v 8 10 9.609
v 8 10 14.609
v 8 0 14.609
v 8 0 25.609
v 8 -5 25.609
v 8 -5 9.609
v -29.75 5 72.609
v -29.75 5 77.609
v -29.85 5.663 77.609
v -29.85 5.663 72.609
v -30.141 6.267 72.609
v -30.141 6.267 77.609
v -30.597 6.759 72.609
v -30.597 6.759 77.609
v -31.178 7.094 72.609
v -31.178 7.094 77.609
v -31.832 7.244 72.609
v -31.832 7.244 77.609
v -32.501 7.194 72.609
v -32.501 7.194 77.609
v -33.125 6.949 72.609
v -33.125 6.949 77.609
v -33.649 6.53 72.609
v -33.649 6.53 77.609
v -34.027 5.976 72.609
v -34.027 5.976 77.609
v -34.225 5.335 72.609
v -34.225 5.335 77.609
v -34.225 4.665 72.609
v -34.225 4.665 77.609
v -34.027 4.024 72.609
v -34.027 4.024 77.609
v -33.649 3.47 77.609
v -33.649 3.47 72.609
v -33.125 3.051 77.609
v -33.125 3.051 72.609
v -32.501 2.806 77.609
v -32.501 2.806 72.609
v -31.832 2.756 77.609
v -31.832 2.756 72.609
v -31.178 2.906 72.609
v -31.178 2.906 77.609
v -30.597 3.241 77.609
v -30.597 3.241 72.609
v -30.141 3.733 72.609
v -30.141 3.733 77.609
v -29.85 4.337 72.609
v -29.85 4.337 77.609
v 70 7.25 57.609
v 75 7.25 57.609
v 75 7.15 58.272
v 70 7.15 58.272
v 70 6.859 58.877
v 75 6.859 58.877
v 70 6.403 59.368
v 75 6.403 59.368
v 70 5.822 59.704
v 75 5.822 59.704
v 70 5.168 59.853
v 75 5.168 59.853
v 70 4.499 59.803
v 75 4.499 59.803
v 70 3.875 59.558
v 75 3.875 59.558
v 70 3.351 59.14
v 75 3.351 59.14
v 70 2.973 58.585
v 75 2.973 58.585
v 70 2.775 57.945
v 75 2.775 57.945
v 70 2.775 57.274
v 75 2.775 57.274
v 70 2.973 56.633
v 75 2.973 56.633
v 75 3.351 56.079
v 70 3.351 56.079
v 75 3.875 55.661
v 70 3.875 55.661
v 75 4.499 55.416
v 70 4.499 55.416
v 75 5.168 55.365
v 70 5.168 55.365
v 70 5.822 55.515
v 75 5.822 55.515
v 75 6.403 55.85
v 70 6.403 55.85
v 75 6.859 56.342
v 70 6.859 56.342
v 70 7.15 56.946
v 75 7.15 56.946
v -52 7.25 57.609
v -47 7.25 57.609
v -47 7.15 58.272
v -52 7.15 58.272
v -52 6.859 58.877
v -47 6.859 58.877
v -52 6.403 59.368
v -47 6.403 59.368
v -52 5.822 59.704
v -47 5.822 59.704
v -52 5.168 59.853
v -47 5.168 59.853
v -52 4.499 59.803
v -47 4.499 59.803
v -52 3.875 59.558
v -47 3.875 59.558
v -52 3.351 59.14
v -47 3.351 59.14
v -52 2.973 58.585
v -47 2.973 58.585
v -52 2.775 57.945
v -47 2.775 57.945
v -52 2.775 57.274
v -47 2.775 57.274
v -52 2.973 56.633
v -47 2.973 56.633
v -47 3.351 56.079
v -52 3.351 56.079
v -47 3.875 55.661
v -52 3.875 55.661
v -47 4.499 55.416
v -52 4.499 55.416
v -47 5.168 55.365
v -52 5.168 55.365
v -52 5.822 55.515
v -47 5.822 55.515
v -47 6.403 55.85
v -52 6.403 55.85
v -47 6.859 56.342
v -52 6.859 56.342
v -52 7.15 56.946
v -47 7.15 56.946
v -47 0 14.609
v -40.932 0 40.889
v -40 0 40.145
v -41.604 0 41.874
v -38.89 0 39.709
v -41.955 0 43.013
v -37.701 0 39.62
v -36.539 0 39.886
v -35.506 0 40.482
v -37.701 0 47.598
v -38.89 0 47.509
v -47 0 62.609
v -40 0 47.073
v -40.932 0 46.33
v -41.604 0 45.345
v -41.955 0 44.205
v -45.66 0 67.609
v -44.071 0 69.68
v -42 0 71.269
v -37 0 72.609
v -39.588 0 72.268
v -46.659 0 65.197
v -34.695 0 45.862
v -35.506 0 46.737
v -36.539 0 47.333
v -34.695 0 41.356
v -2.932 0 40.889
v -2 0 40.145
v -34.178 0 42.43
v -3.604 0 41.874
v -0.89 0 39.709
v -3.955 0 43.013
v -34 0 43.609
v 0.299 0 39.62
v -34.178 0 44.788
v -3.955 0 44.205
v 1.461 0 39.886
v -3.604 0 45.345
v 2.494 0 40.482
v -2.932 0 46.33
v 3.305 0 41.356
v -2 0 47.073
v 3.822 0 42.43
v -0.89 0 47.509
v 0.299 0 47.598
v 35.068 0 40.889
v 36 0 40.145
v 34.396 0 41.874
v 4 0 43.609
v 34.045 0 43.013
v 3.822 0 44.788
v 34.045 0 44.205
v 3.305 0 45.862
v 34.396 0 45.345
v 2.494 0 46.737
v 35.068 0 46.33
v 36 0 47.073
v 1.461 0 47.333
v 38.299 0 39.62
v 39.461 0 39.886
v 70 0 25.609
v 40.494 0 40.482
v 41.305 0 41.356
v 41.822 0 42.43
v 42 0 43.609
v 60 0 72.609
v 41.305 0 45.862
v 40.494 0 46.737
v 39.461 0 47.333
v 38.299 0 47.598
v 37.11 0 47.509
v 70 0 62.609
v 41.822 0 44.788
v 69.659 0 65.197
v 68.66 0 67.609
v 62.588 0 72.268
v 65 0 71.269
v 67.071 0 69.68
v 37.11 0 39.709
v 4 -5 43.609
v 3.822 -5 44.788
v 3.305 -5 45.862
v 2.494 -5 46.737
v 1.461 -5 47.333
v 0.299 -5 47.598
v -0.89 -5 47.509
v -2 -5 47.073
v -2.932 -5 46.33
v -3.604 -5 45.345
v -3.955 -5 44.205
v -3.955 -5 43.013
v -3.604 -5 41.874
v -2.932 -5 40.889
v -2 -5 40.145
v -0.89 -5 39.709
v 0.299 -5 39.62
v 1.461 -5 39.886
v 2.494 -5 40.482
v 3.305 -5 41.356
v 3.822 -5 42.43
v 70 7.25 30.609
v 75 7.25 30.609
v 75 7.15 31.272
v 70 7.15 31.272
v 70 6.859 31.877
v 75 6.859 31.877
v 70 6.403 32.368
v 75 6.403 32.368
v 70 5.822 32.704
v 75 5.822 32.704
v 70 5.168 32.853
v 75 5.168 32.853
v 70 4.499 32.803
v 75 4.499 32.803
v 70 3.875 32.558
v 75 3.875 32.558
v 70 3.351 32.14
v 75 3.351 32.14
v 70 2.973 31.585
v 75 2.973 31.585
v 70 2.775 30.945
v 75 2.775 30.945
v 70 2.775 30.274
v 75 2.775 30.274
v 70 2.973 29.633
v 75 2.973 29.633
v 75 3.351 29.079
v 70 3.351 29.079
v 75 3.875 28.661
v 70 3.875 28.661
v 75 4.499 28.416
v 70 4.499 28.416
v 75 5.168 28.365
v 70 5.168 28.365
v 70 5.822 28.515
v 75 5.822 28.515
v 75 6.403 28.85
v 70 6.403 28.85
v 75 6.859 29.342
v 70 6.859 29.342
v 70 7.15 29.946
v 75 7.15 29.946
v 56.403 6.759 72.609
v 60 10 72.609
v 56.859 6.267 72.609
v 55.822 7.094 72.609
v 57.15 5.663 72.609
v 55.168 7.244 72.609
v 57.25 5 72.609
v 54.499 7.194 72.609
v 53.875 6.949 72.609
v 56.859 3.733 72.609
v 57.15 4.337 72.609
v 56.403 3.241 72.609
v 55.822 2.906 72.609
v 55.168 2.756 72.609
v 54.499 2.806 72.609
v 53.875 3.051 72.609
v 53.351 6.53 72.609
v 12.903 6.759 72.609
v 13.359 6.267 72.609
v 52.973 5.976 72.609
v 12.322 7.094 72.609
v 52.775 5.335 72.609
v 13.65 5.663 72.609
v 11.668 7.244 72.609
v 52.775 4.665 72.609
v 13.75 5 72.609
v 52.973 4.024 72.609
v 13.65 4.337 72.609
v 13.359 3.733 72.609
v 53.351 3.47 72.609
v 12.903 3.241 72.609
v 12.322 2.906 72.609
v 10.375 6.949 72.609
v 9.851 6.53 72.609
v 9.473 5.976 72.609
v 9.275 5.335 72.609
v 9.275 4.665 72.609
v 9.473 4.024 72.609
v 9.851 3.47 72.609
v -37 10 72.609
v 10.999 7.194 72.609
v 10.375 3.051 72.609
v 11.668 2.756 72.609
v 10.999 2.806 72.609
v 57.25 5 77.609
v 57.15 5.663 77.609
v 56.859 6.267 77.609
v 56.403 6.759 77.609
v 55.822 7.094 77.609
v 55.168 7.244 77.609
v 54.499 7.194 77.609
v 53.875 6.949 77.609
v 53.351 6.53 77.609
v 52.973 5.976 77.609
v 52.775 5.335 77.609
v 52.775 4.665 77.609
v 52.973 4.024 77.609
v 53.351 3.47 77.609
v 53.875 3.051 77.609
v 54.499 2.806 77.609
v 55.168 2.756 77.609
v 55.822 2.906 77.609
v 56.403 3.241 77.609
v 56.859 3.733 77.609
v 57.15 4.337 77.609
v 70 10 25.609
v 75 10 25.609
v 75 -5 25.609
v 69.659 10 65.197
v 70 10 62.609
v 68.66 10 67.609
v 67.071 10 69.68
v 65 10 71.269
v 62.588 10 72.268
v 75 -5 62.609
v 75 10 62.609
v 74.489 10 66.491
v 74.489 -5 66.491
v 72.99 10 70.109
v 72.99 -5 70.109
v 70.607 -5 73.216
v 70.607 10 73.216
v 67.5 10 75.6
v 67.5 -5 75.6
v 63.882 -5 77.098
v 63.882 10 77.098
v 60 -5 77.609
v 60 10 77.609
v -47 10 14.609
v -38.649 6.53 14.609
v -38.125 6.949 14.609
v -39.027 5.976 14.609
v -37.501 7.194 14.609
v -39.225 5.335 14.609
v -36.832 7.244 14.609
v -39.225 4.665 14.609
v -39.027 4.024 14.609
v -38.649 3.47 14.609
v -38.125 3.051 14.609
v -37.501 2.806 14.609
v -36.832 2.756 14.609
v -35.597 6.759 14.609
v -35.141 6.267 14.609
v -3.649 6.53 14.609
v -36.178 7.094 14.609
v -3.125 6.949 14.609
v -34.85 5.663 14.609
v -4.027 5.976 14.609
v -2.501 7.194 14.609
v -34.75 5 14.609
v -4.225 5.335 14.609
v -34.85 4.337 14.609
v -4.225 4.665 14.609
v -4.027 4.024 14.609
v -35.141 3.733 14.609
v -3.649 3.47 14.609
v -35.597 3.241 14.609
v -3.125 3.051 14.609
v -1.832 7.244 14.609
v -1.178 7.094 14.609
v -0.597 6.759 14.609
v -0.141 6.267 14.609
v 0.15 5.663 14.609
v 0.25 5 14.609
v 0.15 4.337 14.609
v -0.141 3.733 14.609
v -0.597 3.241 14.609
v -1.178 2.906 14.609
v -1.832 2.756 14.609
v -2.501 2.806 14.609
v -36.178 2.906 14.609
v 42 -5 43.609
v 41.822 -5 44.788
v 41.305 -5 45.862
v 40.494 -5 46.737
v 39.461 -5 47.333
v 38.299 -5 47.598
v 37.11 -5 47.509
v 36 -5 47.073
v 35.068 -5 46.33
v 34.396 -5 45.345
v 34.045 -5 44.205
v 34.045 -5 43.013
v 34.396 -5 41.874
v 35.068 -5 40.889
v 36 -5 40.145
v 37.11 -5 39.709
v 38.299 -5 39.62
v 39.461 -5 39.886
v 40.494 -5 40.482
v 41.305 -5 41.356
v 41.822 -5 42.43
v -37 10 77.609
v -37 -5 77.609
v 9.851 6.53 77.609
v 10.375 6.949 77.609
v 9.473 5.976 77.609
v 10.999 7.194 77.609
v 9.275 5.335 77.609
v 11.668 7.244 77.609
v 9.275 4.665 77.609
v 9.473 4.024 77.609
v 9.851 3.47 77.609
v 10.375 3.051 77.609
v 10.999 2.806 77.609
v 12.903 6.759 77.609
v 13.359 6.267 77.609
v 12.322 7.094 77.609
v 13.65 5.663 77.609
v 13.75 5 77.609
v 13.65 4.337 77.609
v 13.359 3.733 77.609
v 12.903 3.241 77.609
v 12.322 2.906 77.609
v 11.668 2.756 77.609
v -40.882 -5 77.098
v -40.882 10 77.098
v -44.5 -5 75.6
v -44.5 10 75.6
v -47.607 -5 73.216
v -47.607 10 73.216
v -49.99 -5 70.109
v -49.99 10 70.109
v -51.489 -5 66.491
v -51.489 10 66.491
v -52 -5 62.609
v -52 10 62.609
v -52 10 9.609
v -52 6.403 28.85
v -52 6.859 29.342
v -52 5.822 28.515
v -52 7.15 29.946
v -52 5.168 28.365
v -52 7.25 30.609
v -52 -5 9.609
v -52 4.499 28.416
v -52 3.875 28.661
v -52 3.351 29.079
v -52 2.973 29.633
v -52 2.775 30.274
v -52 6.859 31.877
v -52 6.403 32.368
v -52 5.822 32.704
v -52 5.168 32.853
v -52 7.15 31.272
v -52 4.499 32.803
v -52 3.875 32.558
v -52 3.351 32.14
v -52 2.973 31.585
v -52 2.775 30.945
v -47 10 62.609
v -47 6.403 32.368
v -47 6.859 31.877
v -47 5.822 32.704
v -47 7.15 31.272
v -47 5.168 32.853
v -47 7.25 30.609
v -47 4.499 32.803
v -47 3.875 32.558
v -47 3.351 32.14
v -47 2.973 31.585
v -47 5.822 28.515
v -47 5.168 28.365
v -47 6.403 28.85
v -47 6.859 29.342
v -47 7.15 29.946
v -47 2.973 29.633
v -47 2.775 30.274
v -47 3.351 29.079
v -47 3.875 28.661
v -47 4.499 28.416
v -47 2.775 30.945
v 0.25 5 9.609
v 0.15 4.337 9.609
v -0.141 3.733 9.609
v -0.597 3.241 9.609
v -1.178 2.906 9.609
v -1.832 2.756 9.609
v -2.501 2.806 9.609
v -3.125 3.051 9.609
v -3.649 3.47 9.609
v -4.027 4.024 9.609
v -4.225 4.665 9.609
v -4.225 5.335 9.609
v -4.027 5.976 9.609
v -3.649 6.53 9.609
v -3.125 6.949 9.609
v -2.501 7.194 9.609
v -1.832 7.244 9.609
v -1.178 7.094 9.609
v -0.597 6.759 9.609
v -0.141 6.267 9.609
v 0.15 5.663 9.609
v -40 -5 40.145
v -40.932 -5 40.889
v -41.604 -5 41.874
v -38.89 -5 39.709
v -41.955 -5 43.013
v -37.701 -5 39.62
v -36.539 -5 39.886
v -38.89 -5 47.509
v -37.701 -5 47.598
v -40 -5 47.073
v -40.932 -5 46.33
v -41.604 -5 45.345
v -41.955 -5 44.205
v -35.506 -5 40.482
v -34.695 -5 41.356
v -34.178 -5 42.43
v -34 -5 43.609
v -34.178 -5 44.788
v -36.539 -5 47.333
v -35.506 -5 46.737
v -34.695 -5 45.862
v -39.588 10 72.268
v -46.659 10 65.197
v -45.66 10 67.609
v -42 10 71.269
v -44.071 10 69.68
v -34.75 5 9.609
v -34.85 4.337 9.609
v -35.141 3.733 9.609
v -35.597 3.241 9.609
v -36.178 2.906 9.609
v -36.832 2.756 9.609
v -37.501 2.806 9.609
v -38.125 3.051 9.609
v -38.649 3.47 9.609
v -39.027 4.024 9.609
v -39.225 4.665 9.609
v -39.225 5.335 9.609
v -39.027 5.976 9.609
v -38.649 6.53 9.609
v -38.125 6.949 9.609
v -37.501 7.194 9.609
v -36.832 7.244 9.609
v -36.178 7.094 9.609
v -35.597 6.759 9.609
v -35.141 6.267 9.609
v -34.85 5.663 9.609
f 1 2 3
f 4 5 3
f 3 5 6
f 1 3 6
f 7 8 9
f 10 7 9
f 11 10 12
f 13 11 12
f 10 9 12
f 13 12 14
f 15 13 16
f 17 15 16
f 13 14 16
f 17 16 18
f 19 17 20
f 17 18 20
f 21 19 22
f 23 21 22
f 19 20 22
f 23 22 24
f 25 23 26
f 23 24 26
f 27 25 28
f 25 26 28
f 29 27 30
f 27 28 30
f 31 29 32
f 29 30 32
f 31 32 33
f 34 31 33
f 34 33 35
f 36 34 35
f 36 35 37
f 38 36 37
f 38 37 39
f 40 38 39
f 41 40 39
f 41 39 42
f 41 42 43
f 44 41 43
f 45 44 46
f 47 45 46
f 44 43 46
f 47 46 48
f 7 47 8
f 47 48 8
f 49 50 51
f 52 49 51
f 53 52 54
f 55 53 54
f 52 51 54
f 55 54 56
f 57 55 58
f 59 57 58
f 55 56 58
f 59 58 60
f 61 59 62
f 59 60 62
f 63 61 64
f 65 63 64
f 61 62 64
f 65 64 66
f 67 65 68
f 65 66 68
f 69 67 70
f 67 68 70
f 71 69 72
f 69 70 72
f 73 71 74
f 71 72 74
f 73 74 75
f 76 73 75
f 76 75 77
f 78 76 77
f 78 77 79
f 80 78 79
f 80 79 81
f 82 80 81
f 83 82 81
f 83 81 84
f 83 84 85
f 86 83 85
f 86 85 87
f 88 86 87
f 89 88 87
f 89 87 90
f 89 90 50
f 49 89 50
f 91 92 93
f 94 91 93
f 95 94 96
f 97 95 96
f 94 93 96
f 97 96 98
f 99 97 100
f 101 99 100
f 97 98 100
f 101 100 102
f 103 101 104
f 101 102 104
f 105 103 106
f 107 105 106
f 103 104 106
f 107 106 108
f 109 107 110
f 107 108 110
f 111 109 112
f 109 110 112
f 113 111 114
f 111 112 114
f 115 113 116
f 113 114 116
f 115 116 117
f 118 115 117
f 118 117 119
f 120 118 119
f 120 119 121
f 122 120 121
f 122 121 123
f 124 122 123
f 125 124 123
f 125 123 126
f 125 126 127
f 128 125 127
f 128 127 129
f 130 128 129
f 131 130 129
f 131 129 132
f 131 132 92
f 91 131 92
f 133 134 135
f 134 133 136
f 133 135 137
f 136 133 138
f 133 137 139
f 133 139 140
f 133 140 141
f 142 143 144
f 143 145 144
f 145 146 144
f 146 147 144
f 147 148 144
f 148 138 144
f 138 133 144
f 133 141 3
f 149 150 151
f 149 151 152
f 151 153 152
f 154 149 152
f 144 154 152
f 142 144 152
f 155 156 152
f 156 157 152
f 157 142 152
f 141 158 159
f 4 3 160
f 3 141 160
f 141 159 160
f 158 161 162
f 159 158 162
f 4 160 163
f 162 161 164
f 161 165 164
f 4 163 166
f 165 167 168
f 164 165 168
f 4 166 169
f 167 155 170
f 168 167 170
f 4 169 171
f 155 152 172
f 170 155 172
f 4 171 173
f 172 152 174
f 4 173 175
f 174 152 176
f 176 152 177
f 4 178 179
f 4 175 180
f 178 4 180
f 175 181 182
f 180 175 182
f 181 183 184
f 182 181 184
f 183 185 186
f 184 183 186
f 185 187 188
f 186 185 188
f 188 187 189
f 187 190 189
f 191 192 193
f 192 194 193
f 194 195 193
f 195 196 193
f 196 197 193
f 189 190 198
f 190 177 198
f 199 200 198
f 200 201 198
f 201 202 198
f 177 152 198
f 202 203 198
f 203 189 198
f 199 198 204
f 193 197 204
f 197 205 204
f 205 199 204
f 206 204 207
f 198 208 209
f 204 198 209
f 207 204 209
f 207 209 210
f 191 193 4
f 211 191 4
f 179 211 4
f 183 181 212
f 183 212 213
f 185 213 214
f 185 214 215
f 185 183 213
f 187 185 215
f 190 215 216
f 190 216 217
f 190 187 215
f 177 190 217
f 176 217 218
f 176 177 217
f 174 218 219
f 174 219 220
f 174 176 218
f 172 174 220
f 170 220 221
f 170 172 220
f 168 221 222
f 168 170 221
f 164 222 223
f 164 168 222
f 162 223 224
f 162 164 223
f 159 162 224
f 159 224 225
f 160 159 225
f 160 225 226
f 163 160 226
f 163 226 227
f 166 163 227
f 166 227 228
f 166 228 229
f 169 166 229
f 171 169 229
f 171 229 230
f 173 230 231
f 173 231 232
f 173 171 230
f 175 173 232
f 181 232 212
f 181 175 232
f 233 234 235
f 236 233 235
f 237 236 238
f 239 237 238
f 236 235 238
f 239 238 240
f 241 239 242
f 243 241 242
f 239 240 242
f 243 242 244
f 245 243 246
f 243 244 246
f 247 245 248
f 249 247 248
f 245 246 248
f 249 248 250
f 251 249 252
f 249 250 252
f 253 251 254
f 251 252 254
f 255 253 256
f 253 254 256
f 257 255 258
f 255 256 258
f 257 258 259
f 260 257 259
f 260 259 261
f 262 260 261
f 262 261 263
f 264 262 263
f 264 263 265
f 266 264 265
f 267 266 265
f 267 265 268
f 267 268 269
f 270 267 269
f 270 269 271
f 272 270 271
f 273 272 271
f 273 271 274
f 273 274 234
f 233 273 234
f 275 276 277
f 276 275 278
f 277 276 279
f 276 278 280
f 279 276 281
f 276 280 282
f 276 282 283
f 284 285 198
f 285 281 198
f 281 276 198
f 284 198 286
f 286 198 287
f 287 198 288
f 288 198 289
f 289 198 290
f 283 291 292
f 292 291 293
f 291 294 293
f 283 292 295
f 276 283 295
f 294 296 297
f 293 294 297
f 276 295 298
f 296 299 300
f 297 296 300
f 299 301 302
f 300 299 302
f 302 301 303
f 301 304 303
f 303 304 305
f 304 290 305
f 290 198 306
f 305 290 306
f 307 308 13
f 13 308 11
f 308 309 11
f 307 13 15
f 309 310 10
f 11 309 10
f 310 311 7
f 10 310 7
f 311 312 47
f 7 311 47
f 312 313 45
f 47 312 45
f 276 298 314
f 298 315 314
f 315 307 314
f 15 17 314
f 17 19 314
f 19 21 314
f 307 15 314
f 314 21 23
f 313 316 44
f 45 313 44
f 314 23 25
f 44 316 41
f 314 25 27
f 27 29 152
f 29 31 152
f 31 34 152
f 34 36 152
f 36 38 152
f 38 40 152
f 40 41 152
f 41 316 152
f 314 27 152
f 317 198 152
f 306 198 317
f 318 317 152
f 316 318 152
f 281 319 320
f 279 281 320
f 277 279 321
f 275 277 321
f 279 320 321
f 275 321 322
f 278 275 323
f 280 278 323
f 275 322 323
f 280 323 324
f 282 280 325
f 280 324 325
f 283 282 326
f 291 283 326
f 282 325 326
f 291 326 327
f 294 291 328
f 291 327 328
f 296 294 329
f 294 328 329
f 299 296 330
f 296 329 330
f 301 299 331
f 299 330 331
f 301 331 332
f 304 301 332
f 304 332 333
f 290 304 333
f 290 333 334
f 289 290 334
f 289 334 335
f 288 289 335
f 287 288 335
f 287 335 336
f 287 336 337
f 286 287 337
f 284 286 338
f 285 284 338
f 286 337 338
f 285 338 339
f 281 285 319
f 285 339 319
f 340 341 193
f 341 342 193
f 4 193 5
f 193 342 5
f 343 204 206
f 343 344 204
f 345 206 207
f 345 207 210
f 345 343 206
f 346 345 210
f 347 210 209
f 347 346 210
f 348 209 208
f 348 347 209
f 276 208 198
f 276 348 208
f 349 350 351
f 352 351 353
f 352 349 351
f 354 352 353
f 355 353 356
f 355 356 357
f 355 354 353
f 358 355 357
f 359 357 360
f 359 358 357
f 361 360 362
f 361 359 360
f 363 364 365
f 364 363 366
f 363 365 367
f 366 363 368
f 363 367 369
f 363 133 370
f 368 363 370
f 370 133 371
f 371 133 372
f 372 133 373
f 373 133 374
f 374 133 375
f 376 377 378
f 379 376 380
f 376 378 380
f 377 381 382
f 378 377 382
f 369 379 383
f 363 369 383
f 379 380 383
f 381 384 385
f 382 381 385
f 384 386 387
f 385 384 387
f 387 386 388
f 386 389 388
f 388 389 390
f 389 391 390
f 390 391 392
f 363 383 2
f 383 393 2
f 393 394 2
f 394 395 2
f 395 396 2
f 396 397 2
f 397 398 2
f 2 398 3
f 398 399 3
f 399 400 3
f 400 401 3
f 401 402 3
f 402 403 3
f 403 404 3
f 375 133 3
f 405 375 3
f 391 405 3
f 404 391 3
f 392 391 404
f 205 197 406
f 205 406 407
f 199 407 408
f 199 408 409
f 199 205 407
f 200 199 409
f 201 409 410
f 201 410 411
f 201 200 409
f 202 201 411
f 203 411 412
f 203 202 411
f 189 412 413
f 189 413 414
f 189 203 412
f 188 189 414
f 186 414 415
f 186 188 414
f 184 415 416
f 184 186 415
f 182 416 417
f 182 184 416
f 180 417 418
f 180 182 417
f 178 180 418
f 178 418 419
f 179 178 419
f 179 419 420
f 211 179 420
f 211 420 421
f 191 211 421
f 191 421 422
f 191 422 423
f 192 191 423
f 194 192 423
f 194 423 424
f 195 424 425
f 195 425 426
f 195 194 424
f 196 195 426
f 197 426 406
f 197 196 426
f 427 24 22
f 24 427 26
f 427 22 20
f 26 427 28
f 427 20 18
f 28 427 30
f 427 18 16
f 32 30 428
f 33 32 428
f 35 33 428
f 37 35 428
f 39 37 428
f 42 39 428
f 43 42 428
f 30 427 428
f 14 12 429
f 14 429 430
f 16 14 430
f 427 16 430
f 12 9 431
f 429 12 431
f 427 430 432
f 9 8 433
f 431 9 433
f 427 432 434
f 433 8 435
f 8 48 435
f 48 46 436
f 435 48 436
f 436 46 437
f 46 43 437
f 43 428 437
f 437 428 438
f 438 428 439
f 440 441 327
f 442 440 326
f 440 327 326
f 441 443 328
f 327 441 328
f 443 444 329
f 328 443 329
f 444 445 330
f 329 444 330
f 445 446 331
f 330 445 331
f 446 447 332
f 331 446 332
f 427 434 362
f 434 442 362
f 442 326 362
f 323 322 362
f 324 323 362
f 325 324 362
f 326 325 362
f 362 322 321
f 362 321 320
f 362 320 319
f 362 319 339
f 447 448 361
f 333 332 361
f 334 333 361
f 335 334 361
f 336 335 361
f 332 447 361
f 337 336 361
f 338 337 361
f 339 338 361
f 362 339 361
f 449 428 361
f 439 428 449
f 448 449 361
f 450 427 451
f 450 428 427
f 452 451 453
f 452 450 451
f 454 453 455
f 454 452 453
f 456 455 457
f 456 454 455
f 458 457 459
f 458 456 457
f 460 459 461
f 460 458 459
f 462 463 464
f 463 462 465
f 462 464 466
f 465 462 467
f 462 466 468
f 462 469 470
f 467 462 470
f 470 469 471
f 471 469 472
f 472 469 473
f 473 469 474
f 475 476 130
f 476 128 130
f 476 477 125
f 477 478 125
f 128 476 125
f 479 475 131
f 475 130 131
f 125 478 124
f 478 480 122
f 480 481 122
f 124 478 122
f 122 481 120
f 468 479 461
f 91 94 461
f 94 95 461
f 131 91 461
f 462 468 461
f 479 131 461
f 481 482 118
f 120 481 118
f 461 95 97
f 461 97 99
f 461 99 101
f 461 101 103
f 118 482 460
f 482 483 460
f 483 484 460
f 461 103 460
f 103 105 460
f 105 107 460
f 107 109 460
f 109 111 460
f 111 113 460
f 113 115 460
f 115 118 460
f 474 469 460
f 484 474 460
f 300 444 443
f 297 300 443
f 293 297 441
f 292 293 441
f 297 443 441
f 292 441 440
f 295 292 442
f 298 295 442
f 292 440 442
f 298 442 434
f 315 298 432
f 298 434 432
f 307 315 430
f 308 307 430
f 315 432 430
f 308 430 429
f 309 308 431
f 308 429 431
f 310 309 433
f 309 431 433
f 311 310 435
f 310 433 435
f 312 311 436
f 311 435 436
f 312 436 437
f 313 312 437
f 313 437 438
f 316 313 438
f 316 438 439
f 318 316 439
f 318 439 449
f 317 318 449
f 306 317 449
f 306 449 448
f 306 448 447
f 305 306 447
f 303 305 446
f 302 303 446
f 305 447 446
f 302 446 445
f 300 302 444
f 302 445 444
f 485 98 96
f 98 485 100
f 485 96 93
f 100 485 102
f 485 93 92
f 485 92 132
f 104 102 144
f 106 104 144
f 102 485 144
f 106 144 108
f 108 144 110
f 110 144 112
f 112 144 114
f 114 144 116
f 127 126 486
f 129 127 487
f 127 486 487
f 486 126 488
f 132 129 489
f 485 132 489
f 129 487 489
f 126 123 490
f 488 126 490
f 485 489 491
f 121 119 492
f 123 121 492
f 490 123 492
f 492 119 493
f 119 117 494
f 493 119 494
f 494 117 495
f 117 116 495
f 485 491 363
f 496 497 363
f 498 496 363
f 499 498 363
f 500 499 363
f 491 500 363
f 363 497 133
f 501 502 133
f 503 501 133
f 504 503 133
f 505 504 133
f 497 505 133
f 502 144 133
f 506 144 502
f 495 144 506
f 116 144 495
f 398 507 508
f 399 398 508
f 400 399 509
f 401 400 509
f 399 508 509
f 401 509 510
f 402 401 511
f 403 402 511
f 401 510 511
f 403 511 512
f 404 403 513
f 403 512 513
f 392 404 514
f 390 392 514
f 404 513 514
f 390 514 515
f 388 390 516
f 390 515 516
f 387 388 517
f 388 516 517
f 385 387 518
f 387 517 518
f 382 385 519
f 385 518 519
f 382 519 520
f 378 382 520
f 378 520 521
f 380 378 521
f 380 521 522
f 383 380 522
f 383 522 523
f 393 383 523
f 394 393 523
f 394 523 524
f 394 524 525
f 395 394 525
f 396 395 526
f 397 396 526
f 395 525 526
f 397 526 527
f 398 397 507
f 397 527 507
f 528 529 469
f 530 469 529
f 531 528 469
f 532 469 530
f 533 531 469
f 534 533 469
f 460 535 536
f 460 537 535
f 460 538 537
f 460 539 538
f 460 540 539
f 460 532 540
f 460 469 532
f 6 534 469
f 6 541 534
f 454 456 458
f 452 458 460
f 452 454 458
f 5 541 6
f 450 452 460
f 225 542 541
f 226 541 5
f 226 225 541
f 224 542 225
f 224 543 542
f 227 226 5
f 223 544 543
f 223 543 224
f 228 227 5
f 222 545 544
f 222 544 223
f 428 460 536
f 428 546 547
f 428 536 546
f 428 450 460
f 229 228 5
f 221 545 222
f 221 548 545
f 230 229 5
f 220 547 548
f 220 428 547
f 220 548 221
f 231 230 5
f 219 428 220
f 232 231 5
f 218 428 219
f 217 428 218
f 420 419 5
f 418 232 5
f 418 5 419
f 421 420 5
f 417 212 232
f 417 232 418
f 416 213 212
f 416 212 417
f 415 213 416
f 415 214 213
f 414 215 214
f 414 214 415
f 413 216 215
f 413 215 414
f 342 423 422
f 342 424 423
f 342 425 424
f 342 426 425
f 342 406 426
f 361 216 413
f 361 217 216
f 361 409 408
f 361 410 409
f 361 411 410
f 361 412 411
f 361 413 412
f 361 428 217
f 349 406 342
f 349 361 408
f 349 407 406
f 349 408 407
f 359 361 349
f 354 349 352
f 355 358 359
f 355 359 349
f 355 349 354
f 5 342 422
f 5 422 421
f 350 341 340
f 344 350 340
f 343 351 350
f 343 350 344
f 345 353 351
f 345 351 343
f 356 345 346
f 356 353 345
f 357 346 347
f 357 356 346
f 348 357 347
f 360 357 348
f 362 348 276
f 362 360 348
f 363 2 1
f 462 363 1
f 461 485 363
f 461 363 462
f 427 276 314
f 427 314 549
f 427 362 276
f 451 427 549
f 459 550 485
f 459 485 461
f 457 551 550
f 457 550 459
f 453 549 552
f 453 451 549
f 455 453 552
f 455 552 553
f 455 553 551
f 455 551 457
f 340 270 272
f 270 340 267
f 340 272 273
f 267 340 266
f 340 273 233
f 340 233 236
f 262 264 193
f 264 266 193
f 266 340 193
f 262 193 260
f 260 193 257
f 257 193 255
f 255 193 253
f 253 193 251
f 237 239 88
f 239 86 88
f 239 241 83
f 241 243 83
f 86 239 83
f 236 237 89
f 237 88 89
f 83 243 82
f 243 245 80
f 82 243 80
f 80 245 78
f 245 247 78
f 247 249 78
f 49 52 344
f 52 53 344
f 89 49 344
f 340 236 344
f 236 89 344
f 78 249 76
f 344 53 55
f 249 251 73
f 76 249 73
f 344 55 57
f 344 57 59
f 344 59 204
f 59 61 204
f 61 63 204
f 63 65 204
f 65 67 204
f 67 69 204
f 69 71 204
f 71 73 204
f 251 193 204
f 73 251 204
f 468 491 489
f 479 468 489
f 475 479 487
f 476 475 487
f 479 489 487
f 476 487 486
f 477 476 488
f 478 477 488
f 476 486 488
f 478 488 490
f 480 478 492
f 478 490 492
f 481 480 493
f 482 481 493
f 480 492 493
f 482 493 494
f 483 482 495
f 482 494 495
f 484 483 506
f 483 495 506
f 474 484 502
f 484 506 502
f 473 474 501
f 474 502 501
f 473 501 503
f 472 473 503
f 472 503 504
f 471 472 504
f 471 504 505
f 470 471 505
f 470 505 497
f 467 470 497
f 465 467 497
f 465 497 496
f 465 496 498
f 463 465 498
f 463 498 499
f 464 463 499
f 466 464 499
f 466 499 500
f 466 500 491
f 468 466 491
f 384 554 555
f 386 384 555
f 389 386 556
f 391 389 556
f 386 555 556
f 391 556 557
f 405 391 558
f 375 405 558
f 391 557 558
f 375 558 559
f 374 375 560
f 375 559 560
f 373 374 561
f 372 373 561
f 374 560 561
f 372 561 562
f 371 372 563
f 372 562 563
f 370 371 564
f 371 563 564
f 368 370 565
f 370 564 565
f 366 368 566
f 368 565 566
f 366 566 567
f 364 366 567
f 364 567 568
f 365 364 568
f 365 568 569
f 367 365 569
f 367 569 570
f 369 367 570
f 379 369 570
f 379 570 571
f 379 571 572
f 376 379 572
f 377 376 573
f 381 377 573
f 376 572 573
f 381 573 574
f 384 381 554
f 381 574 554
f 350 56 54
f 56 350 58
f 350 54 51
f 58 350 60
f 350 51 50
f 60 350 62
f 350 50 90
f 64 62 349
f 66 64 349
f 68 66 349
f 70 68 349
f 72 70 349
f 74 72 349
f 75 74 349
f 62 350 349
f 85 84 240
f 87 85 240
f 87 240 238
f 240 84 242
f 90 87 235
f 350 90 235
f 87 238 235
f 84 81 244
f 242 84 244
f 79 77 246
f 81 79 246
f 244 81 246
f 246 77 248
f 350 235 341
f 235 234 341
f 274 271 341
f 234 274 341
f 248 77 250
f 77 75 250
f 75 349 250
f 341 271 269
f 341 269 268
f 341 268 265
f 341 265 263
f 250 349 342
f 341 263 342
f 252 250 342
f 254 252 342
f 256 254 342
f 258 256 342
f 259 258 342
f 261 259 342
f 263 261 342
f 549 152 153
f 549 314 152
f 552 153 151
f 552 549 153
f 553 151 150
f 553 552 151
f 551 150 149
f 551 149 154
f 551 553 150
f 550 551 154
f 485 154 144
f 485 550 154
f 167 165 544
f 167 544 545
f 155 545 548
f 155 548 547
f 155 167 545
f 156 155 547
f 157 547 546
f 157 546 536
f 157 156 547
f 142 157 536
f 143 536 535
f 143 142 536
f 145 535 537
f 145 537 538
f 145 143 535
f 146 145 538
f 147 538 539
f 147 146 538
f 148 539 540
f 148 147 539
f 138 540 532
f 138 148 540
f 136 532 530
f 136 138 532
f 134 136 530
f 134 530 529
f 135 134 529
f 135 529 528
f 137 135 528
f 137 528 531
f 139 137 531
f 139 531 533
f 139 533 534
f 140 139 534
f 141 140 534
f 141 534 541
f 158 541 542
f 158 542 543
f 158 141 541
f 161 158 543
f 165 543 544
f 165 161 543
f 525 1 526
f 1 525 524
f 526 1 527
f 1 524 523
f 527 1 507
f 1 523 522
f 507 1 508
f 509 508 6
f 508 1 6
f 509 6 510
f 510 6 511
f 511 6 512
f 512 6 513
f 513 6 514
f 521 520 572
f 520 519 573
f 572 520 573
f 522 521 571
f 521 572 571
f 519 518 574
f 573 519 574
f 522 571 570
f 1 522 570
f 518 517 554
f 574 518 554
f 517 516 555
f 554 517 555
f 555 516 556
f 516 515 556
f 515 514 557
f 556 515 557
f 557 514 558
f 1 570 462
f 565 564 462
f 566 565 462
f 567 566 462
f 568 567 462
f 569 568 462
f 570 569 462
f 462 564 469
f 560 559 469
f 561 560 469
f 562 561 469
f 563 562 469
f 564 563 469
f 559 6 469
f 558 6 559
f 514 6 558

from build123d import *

# Parameters (mm, degrees)
F0_R     = 4
F1_DEPTH = 5
F3_DEPTH = 10
F4_R     = 2.25
F5_DEPTH = 5
F6_R     = 2.25
F7_DEPTH = 127.001
F8_R     = 2.25
F9_DEPTH = 5
F10_R    = 10
F11_R    = 15


with BuildPart() as f1:
    # F0 (on Front) → F1 (new body)
    with BuildSketch(Plane.XZ):
        Polygon((75, 77.609202), (-52, 77.609202), (-52, 9.609202), (8, 9.609202), (8, 25.609202), (75, 25.609202), align=None)
        with Locations((-38, 43.609202)):
            Circle(F0_R, mode=Mode.SUBTRACT)
        with Locations((0, 43.609202)):
            Circle(F0_R, mode=Mode.SUBTRACT)
        with Locations((38, 43.609202)):
            Circle(F0_R, mode=Mode.SUBTRACT)
    extrude(amount=F1_DEPTH)

    # F2 (on face) → F3 (join)
    with BuildSketch(Plane(origin=(0, 0, 0), x_dir=(-1, 0, 0), z_dir=(0, 1, 0))):
        Polygon((-75, 77.609202), (-75, 25.609202), (-70, 25.609202), (-70, 72.609202), (47, 72.609202), (47, 14.609202), (-8, 14.609202), (-8, 9.609202), (52, 9.609202), (52, 77.609202), align=None)
    extrude(amount=F3_DEPTH)

    # F4 (on face) → F5 (cut, through all)
    with BuildSketch(Plane(origin=(0, 0, 9.609202), x_dir=(1, 0, 0), z_dir=(0, 0, -1))):
        with Locations((-37, -5)):
            Circle(F4_R)
        with Locations((-2, -5)):
            Circle(F4_R)
    extrude(amount=-F5_DEPTH, mode=Mode.SUBTRACT)

    # F6 (on face) → F7 (cut, through all)
    with BuildSketch(Plane.YZ.offset(75)):
        with Locations((5, 30.609202)):
            Circle(F6_R)
        with Locations((5, 57.609202)):
            Circle(F6_R)
    extrude(amount=-F7_DEPTH, mode=Mode.SUBTRACT)

    # F8 (on face) → F9 (cut, through all)
    with BuildSketch(Plane.XY.offset(77.609202)):
        with Locations((55, 5)):
            Circle(F8_R)
        with Locations((11.5, 5)):
            Circle(F8_R)
        with Locations((-32, 5)):
            Circle(F8_R)
    extrude(amount=-F9_DEPTH, mode=Mode.SUBTRACT)

    # F10
    f10_edges = [f1.edges().sort_by_distance(p)[0] for p in [
        (70, 5, 72.609202),
        (-47, 5, 72.609202),
    ]]
    fillet(f10_edges, radius=F10_R)

    # F11
    f11_edges = [f1.edges().sort_by_distance(p)[0] for p in [
        (75, 2.5, 77.609202),
        (-52, 2.5, 77.609202),
    ]]
    fillet(f11_edges, radius=F11_R)


solid = f1.part
